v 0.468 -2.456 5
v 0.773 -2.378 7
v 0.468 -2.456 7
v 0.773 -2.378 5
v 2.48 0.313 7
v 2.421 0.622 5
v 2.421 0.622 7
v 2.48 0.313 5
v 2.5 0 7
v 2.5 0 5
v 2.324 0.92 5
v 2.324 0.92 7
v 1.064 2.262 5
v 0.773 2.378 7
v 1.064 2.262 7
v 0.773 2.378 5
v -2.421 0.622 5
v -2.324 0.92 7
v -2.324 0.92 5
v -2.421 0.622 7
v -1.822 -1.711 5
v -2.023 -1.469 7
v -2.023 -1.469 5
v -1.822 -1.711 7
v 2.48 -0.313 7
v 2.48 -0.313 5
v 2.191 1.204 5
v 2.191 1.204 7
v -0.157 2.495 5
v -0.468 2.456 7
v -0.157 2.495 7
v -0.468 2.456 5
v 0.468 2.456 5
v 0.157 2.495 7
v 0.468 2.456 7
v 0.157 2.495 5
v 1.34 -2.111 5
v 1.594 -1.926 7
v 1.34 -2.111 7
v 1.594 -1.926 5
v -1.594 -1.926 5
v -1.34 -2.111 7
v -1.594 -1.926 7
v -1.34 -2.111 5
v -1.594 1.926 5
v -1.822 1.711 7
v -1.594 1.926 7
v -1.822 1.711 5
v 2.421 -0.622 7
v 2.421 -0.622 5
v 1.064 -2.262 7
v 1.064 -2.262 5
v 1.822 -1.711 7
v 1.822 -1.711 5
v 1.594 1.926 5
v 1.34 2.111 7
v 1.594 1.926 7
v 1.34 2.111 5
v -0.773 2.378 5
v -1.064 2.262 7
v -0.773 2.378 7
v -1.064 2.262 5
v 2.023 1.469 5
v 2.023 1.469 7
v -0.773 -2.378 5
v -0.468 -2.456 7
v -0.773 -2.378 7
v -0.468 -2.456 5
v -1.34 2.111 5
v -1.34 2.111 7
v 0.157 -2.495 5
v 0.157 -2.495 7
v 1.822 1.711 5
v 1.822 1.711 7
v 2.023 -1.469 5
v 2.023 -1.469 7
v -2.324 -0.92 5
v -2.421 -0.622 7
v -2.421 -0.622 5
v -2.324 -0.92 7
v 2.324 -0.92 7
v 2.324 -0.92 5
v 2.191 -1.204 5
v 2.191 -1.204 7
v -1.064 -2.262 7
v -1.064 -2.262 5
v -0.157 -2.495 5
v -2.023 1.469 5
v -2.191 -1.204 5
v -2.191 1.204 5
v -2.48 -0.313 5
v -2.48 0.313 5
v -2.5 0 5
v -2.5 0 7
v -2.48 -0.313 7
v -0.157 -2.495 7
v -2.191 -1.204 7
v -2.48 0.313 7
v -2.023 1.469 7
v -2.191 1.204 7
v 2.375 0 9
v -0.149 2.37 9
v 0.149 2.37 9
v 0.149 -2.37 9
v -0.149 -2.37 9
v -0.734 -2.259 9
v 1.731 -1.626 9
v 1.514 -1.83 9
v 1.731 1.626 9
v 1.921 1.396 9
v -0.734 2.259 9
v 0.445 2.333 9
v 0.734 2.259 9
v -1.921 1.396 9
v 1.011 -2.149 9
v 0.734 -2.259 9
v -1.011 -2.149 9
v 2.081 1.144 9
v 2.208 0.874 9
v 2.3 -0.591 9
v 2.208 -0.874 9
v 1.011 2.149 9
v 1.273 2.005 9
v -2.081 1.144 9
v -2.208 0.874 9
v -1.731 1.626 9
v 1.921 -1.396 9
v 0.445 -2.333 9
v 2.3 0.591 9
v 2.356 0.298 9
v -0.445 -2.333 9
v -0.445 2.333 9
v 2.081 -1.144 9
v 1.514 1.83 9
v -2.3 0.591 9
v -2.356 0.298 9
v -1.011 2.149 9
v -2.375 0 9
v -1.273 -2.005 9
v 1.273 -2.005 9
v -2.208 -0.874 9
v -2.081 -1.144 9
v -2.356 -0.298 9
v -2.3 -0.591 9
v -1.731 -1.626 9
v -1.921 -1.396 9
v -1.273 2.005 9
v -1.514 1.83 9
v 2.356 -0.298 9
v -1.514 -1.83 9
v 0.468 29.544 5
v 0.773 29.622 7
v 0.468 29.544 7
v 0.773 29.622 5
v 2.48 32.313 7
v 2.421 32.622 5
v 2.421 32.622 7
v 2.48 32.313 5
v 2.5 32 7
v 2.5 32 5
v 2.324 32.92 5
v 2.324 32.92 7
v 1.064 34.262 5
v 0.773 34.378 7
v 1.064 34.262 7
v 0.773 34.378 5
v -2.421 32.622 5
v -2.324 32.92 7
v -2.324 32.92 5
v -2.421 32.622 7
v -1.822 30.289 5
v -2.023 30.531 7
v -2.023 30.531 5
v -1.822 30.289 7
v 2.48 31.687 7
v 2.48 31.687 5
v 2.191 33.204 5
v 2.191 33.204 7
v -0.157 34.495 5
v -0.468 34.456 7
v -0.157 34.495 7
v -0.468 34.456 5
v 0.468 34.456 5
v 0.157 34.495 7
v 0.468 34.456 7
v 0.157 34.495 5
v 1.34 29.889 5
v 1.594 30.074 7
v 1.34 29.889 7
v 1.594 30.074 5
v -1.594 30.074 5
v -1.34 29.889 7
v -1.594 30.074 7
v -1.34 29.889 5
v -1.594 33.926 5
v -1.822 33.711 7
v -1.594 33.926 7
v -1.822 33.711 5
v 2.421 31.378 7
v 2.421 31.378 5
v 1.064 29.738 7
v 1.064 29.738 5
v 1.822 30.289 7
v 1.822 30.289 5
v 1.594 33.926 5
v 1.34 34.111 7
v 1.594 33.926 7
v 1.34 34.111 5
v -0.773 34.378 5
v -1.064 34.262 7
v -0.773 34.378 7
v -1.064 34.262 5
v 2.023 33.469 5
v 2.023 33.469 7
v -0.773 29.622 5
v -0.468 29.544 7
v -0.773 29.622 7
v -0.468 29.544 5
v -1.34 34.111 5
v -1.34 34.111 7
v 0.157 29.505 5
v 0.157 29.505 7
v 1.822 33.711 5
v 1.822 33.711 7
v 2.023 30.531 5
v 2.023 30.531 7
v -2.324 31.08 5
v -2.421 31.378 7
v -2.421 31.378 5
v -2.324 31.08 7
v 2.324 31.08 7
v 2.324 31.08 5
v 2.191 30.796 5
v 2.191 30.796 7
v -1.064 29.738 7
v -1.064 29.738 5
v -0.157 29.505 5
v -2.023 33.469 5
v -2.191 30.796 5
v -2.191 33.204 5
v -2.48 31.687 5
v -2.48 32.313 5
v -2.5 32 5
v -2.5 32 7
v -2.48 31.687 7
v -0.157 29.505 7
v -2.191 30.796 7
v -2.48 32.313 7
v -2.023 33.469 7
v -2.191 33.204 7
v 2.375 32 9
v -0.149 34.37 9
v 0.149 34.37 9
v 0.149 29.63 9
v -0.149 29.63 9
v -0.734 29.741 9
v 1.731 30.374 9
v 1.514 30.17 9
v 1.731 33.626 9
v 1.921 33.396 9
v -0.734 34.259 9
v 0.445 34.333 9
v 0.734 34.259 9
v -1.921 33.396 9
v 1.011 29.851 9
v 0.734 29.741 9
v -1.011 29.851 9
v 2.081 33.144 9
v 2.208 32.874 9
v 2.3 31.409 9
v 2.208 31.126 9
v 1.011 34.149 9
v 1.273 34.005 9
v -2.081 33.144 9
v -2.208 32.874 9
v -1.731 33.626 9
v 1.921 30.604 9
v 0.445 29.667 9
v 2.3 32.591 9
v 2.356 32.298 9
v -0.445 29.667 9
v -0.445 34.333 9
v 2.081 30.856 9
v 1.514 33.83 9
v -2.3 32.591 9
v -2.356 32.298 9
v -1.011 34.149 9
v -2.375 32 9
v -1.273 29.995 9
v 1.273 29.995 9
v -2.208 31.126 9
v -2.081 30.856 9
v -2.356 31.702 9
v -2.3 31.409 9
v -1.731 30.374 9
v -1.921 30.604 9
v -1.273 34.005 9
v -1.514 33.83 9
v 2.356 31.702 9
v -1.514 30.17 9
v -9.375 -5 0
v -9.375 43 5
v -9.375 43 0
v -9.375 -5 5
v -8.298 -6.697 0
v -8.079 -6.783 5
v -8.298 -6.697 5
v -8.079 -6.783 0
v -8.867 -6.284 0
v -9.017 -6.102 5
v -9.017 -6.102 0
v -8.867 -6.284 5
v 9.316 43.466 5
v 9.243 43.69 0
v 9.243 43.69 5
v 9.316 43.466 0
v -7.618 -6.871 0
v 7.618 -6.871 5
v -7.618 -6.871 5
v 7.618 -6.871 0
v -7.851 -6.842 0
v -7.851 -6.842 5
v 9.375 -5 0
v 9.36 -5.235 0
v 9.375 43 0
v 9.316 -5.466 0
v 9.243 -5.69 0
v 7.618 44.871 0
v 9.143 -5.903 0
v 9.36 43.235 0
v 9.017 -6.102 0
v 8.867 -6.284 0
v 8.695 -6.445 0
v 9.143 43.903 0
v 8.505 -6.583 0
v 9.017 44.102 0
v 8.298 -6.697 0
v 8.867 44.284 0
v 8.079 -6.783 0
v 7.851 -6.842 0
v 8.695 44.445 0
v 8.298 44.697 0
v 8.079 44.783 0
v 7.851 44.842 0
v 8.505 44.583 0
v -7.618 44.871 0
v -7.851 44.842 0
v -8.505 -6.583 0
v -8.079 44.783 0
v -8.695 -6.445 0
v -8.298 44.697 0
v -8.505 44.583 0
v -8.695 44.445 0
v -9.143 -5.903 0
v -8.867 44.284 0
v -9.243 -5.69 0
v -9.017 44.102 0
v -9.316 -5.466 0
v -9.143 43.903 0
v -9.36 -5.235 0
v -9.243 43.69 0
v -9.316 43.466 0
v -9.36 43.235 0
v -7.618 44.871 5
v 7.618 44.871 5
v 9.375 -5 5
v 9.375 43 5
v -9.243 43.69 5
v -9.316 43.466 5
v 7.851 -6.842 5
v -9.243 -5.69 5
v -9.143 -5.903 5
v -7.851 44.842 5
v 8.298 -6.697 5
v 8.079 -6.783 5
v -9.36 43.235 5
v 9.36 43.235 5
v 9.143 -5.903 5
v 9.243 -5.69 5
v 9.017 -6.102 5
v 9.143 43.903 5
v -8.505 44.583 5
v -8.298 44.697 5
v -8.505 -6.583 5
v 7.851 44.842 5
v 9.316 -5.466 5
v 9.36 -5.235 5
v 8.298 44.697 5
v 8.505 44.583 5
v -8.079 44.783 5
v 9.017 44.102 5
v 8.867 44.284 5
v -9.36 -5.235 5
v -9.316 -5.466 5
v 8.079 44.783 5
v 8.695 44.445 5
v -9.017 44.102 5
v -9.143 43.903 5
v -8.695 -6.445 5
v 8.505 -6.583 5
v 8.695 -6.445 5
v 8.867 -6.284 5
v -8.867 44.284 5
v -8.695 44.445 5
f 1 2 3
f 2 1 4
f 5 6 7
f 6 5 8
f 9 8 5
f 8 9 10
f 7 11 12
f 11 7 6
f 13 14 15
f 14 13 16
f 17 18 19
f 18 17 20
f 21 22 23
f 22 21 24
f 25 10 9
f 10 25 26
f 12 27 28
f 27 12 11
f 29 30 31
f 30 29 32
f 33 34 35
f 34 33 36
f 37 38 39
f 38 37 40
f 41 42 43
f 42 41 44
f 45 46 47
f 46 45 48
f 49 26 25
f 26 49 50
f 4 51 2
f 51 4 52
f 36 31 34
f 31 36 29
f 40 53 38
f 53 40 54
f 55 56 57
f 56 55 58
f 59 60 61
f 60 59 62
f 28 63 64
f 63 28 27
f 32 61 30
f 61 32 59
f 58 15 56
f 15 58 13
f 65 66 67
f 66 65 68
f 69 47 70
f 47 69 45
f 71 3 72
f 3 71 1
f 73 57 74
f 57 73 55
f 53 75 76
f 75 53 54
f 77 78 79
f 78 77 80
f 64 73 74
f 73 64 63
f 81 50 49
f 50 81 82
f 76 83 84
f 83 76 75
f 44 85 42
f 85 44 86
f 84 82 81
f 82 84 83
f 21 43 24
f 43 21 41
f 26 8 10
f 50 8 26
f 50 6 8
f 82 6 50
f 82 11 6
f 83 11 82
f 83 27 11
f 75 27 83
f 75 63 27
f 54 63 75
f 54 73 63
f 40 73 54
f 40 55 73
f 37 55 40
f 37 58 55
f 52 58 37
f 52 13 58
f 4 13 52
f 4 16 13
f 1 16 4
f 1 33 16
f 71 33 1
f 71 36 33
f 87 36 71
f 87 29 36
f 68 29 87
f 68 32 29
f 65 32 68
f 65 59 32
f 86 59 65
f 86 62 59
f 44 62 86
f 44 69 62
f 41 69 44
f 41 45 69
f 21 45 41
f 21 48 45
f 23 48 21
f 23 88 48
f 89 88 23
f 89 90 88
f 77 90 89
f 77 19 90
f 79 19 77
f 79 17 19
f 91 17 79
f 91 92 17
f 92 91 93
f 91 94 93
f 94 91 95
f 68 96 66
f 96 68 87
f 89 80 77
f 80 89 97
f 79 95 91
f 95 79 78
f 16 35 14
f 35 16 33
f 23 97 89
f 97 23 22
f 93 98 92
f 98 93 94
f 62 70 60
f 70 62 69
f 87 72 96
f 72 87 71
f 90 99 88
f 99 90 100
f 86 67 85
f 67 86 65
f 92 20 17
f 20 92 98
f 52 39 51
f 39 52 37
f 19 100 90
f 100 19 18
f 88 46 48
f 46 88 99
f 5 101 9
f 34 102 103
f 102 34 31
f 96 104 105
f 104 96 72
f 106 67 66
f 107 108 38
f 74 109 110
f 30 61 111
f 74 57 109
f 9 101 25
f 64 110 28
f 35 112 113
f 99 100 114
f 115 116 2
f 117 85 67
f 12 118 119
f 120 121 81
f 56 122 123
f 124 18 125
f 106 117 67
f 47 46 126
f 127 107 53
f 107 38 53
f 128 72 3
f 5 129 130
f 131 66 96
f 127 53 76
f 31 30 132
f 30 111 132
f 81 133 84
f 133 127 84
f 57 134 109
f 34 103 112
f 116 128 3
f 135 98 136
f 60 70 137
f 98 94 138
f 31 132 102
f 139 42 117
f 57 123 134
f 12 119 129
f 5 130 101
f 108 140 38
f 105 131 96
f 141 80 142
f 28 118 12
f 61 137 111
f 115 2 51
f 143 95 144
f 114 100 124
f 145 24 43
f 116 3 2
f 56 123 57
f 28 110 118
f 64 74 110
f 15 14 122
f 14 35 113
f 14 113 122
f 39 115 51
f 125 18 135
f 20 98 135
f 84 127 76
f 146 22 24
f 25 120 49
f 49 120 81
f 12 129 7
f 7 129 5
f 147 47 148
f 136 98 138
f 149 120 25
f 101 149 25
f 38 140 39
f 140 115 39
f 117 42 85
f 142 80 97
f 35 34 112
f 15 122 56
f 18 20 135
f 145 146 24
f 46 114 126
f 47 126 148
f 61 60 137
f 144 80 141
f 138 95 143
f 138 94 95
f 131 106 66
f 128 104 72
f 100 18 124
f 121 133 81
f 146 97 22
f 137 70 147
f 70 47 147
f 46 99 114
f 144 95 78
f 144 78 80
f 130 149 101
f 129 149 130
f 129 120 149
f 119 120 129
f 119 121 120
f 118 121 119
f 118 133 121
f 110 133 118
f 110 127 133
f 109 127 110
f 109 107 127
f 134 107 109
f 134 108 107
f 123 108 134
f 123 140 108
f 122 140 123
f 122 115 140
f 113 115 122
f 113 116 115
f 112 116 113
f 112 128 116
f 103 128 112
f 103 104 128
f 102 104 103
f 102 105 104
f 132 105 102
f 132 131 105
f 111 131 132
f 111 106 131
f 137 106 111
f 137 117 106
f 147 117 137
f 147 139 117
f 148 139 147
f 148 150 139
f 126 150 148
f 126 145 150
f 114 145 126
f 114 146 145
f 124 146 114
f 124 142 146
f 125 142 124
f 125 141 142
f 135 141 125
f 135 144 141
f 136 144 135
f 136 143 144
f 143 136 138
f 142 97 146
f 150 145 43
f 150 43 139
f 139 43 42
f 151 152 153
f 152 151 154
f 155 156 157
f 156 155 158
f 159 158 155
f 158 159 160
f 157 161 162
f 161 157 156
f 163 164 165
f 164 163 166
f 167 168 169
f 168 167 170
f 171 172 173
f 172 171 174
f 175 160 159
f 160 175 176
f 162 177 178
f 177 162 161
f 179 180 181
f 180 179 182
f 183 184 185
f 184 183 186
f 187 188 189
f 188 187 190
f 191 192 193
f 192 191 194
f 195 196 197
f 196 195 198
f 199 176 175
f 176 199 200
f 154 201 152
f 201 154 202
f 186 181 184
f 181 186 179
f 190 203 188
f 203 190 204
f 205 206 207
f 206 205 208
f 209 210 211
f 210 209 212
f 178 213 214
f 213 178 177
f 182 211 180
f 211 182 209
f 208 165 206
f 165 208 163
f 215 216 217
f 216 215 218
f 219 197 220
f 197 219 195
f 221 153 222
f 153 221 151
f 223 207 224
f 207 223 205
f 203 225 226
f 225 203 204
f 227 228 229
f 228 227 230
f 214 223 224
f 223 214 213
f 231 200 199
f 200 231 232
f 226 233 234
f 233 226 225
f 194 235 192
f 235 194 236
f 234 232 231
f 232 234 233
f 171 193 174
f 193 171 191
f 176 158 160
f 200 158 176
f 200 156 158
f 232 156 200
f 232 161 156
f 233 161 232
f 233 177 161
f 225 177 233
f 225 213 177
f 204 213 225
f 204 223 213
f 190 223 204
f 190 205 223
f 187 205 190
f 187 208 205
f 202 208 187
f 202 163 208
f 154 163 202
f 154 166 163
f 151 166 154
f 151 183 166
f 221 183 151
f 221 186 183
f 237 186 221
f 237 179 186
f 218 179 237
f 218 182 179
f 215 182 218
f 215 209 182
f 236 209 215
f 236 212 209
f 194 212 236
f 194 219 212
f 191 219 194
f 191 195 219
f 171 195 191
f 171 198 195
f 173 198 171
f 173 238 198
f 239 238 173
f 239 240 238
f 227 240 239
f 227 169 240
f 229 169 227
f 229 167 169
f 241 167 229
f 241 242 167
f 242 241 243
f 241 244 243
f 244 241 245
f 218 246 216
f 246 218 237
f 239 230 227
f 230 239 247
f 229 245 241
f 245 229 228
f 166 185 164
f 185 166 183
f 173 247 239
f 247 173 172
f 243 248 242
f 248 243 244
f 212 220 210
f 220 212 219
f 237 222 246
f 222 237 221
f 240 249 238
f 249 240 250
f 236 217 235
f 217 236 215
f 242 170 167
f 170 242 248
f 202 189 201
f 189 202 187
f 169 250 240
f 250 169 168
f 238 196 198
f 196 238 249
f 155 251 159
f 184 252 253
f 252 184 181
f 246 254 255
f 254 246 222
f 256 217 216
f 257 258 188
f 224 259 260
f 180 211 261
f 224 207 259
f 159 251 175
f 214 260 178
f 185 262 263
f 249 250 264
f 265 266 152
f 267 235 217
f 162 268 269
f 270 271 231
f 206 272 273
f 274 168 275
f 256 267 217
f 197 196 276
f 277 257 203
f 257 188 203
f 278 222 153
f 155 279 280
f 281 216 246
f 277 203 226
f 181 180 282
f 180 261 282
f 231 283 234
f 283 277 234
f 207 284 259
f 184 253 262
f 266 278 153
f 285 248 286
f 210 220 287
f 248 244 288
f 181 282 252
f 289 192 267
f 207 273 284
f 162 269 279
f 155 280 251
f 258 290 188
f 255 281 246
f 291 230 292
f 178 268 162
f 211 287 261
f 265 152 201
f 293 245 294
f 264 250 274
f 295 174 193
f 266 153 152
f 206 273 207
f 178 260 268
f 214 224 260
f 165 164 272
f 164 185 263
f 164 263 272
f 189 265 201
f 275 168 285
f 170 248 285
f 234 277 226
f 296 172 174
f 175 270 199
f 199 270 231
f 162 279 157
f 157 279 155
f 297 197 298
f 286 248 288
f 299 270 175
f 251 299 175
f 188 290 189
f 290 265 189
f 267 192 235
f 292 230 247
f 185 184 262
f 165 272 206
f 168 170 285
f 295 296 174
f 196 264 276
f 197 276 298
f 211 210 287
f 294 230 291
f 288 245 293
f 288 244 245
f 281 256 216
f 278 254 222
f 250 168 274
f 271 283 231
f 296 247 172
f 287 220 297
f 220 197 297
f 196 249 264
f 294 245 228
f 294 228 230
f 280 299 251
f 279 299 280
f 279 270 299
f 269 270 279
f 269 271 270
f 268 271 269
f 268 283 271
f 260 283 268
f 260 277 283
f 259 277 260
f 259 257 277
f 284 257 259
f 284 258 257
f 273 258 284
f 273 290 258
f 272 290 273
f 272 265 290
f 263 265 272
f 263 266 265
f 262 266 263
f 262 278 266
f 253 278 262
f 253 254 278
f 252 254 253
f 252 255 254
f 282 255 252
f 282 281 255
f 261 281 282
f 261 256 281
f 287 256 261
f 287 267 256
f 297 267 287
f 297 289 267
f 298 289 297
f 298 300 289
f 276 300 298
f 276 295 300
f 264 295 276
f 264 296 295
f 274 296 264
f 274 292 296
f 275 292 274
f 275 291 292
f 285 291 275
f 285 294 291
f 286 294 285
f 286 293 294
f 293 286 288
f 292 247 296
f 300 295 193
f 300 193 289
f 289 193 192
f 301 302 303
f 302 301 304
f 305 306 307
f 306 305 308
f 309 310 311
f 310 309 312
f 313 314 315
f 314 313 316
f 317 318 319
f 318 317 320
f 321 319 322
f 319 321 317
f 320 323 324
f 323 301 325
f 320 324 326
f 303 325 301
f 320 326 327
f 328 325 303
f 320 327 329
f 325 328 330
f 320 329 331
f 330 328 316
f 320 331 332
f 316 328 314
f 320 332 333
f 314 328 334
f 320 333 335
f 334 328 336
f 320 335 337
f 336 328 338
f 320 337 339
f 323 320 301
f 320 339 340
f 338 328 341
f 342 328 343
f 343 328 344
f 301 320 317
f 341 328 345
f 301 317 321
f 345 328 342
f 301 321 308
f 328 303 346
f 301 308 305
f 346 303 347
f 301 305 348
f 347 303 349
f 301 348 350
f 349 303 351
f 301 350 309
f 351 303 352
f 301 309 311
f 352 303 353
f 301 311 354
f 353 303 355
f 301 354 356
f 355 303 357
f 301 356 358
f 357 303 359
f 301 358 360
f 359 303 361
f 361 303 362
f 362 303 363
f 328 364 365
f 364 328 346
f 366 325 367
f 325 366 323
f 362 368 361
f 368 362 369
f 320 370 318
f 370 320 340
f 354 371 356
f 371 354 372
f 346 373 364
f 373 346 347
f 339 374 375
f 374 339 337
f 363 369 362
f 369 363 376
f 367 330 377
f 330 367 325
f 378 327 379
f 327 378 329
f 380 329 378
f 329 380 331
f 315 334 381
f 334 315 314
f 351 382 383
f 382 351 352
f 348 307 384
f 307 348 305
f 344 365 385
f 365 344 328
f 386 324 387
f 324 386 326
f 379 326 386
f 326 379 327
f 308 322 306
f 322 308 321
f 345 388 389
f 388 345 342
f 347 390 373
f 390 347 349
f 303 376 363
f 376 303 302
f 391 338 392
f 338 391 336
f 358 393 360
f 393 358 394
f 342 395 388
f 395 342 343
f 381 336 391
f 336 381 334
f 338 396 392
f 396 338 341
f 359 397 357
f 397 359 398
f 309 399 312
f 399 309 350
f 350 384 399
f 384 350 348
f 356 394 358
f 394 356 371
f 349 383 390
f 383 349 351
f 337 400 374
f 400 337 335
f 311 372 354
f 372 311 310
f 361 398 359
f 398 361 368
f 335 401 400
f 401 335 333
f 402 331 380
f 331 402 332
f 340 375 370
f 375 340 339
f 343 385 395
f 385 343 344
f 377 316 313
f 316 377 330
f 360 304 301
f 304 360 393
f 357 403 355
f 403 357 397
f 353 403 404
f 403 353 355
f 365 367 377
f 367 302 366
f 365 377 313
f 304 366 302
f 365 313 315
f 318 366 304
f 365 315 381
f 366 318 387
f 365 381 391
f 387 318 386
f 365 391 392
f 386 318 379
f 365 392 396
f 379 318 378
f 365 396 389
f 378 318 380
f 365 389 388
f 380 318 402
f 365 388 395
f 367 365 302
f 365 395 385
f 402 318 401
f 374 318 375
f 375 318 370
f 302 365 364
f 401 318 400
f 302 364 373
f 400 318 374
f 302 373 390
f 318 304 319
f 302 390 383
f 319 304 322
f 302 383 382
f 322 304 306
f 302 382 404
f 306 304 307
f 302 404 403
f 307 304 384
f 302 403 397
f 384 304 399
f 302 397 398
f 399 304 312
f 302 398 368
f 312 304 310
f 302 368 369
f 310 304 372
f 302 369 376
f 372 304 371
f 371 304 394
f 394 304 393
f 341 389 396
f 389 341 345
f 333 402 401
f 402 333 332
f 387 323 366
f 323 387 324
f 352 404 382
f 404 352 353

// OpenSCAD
$fn = 50;

block_width = 15;
block_thickness = 5;

block_bottom_extra = 6;

hole_depth = 4;
hole_diameter = 5;
hole_spacing = 32;

hole_radius = hole_diameter / 2;

peg_base_height = 2;
peg_taper = 0.125;

module pin() {
    cylinder(h = peg_base_height, r = hole_radius, center = false);

    translate([0, 0, peg_base_height])
        cylinder(h = hole_depth - peg_base_height, r1 = hole_radius, r2 = hole_radius - peg_taper, center = false);
}

module main() {
    translate([-block_width / 2, -hole_diameter, 0])

        minkowski() {
            l = hole_spacing + (hole_diameter * 2) + block_bottom_extra;

            translate([0, 0, 0])
                cylinder(h = 0.1, r = block_width * 0.125);

            cube([block_width, l, block_thickness - 0.1]);
        }

    translate([0, 0, block_thickness])
        pin();

    translate([0, hole_spacing, block_thickness])
        pin();
}


main();
